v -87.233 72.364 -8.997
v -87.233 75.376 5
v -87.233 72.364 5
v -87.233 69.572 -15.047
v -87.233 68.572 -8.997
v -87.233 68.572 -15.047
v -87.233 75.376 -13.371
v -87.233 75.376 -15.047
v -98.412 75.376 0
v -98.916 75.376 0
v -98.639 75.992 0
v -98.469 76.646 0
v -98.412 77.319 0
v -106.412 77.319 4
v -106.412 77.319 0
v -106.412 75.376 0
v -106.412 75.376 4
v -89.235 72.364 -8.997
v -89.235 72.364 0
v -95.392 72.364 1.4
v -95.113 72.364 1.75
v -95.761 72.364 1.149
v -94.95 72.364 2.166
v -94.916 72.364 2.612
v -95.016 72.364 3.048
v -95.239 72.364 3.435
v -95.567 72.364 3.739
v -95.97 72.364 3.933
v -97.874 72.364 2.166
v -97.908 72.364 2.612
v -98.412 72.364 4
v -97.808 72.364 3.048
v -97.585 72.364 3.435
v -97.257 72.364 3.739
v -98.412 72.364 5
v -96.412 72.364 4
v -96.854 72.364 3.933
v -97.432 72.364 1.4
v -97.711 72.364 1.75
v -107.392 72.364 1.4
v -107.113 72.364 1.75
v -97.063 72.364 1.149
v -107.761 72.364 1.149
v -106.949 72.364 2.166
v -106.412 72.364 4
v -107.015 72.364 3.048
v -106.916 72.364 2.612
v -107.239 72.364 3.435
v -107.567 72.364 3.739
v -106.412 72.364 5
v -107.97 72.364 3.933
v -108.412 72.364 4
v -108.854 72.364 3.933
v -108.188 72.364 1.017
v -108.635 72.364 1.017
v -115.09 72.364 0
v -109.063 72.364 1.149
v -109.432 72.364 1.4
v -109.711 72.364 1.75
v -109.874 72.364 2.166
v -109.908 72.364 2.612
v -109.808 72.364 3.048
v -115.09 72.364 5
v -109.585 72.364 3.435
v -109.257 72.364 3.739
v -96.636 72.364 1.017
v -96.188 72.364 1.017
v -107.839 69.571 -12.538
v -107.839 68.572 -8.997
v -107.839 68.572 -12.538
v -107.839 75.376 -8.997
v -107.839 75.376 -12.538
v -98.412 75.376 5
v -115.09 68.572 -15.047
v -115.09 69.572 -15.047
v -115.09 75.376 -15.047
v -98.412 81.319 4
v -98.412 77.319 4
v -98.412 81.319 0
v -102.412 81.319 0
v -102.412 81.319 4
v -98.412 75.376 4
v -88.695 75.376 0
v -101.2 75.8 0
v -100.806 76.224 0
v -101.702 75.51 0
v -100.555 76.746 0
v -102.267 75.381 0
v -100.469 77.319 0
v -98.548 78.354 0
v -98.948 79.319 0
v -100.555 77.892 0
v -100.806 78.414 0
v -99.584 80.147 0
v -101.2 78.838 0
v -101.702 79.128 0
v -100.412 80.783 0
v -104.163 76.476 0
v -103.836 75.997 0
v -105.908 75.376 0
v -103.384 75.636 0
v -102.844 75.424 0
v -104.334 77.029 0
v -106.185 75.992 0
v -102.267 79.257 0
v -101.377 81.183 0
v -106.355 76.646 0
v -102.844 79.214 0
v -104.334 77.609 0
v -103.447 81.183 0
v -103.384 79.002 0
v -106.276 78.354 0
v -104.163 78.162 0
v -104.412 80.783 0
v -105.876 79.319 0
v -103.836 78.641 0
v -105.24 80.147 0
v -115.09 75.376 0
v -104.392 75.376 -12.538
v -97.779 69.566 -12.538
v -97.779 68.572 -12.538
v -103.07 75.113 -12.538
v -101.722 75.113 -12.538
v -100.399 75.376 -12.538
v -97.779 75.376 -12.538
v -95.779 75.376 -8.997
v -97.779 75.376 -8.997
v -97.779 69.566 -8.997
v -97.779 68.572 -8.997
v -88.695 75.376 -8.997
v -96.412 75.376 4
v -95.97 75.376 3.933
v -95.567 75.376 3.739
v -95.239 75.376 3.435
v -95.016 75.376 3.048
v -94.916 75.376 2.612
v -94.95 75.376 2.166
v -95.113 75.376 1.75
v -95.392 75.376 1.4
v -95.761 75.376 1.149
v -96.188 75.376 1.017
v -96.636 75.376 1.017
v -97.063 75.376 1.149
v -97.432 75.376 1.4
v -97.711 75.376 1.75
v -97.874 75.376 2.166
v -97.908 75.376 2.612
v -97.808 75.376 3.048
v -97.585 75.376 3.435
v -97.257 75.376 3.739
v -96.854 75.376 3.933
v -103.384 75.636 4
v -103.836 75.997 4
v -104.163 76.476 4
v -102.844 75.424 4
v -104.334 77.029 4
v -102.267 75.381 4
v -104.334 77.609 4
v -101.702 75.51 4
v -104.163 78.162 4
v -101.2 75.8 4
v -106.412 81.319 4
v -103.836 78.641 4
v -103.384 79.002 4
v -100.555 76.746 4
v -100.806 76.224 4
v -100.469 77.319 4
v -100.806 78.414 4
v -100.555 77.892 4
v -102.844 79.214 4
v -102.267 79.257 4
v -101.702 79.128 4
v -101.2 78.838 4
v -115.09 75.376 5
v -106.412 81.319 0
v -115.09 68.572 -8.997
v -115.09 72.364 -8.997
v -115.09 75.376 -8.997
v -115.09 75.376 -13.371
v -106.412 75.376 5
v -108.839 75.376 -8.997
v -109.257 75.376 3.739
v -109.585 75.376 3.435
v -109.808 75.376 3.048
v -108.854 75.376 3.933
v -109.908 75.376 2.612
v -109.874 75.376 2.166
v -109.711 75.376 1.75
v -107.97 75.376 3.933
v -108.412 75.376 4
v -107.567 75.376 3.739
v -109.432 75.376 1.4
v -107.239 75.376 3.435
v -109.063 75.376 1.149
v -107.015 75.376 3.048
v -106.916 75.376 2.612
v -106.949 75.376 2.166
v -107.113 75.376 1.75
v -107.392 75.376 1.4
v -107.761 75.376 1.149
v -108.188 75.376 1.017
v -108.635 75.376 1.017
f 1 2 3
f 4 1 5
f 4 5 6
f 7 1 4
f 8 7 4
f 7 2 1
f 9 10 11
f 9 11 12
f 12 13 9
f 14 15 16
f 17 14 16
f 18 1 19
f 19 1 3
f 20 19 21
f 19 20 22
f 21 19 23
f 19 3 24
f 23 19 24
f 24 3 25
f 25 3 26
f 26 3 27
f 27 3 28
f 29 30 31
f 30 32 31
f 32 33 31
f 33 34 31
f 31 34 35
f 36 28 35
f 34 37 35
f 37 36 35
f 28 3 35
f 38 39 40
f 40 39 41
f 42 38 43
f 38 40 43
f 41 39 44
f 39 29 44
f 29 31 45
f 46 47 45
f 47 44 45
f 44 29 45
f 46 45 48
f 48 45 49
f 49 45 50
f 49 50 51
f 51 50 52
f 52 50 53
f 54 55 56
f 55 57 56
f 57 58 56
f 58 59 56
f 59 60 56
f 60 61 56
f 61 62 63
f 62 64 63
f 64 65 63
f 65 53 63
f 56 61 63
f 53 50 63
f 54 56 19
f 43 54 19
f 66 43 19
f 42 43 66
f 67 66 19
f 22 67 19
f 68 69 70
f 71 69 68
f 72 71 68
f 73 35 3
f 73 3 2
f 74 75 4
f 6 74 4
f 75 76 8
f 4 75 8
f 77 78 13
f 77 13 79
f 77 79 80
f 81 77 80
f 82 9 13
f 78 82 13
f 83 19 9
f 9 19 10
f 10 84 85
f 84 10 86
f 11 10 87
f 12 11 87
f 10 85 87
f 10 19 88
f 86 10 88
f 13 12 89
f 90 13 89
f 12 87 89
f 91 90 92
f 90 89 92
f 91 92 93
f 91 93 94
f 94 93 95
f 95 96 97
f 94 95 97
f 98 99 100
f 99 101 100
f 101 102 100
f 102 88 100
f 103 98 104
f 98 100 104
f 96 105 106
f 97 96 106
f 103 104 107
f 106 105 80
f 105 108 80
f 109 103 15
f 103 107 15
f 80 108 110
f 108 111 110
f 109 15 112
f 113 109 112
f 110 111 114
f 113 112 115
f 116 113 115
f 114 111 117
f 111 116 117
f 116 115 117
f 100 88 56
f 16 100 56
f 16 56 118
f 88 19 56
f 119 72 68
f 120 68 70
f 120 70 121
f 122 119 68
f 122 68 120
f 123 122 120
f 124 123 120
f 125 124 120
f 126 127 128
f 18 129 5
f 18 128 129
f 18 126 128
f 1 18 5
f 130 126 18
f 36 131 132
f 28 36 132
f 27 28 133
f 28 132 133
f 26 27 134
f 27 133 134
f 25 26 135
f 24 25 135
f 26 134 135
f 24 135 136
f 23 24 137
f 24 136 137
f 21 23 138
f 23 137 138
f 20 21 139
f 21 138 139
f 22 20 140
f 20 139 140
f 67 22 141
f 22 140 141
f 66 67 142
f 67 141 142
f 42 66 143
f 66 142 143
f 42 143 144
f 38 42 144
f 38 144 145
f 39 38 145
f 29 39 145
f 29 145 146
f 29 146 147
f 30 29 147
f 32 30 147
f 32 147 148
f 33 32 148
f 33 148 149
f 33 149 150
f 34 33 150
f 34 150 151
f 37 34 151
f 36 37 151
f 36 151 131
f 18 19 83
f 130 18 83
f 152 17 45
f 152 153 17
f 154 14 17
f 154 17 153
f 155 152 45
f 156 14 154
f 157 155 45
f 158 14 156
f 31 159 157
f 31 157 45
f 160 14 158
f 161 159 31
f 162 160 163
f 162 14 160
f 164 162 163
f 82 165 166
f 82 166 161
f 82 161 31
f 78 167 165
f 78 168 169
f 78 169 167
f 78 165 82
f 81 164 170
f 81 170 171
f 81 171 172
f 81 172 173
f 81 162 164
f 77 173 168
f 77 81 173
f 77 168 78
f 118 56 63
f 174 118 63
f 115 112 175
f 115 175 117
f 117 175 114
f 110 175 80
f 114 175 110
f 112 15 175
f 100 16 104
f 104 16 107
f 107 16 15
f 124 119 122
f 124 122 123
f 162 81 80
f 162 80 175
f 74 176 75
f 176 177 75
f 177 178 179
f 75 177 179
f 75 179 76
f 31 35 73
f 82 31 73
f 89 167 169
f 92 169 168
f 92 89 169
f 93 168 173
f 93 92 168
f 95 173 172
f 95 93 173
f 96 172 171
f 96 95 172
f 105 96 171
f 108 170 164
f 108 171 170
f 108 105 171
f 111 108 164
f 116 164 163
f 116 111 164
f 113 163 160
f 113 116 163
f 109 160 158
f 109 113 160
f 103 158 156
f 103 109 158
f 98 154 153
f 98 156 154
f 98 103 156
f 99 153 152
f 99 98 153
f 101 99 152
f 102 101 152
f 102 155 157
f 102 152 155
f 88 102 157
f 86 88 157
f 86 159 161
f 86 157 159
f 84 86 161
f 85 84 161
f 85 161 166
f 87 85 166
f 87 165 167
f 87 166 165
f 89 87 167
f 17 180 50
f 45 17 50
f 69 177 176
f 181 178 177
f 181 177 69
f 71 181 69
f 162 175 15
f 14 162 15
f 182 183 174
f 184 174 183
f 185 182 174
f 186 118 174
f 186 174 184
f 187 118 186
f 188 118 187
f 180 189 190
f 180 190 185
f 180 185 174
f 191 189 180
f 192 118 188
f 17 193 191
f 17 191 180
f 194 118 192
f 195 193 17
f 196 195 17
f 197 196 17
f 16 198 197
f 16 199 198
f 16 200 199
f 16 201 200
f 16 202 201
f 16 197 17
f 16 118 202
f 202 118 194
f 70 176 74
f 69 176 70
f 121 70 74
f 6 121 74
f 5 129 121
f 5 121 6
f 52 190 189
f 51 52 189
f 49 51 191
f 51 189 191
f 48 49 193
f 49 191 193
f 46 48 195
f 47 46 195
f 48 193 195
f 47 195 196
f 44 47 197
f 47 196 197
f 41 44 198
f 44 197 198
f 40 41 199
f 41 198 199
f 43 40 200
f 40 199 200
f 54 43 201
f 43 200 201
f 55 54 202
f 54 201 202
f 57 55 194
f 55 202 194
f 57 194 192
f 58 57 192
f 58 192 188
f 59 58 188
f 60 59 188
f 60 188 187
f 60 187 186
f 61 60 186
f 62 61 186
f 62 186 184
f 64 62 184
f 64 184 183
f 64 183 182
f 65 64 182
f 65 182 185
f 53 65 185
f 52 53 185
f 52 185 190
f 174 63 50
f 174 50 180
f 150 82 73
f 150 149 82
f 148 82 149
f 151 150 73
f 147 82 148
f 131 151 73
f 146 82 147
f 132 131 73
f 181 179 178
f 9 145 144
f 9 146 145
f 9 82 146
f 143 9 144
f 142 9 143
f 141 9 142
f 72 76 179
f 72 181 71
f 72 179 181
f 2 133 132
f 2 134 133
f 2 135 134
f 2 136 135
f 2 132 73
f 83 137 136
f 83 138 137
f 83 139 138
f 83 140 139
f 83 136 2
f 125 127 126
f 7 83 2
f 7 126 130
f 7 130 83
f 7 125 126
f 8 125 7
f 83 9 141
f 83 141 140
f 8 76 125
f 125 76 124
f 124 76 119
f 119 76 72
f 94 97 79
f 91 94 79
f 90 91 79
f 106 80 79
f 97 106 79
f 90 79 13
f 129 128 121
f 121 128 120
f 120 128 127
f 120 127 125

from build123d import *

# Parameters (mm, degrees)
SKETCH1_R                 = 1.943369714
BOSS_EXTRUDE1_DEPTH       = 5
SKETCH2_W                 = 5
SKETCH2_H                 = 3.011554738
BOSS_EXTRUDE2_DEPTH       = 3
SKETCH3_W                 = 5
SKETCH3_H                 = 3.011554738
BOSS_EXTRUDE3_DEPTH       = 1
BOSS_EXTRUDE4_DEPTH       = 15.45
BOSS_EXTRUDE5_DEPTH       = 5
BOSS_EXTRUDE6_REACH       = 91.127
SKETCH6_W                 = 4.39741832
SKETCH6_H                 = 3.011554738
SKETCH7_W                 = 27.232002546
SKETCH7_H                 = 1.691876565
BOSS_EXTRUDE7_DEPTH       = 3.011555
CUT_EXTRUDE1_DEPTH        = 1.691877
SKETCH10_R                = 1.5
CUT_EXTRUDE2_DEPTH        = 5
CUT_EXTRUDE3_DEPTH        = 5
SKETCH12_W                = 7.087819815
SKETCH12_H                = 5.363231601
SKETCH12_W_2              = 7.084410937
BOSS_EXTRUDE8_DEPTH       = 3.011555
SKETCH13_R                = 1.5
CUT_EXTRUDE4_DEPTH        = 5
BOSS_EXTRUDE9_START       = -5.000001
BOSS_EXTRUDE9_DEPTH       = 5.000002
SKETCH15_R                = 1.5
BOSS_EXTRUDE10_DEPTH      = 3.011554738
CUT_EXTRUDE6_DEPTH        = 3.011555
BOSS_EXTRUDE11_START      = 1
BOSS_EXTRUDE11_DEPTH      = 1
CUT_EXTRUDE7_DEPTH        = 4
SKETCH21_R                = 1.5
CUT_EXTRUDE8_DEPTH        = 4
CUT_EXTRUDE9_DEPTH        = 1
BOSS_EXTRUDE12_START      = -13.37096588
BOSS_EXTRUDE12_DEPTH      = 4.373492366
BOSS_EXTRUDE13_DEPTH      = 1.68162
SKETCH30_W                = 13.059771794
SKETCH30_H                = 2.186746183
CUT_EXTRUDE10_DEPTH       = 10
SKETCH31_W                = 13.059771794
SKETCH31_H                = 2.186746183
BOSS_EXTRUDE14_DEPTH      = 2.793186
SKETCH32_W                = 27.857200393
SKETCH32_H                = 1.676275872
BOSS_EXTRUDE15_DEPTH      = 5.803619
SKETCH33_W                = 13.059771794
SKETCH33_H                = 1.354144498
CUT_EXTRUDE11_DEPTH       = 5.804742
BOSS_EXTRUDE16_DEPTH      = 0.832602
SKETCH35_W                = 2
SKETCH35_H                = 3.540890681
BOSS_EXTRUDE17_DEPTH      = 5.809427
SKETCH36_W                = 1
SKETCH36_H                = 3.540890681
BOSS_EXTRUDE18_DEPTH      = 5.80474
BOSS_EXTRUDE20_DEPTH      = 2
BOSS_EXTRUDE20_DEPTH_BACK = 2
CUT_EXTRUDE12_DEPTH       = 1


# Read off the part's stored shape, not the designer's step: Boss-Extrude12
with BuildPart() as part:
    # Sketch1 → Boss-Extrude1 (new body)
    with BuildSketch(Plane.XY):
        with BuildLine():
            Line((-105.90797469, 75.375672325), (-114.442913217, 75.375672325))
            Line((-114.442913217, 75.375672325), (-114.442913217, 72.364117587))
            Line((-114.442913217, 72.364117587), (-88.233212536, 72.364117587))
            Line((-88.233212536, 72.364117587), (-88.233212536, 75.375672325))
            Line((-88.233212536, 75.375672325), (-98.915825857, 75.375672325))
            ThreePointArc((-98.915825857, 75.375672325), (-102.411900273, 81.318944809), (-105.90797469, 75.375672325))
        make_face()
        with Locations((-102.411900273, 77.319042039)):
            Circle(SKETCH1_R, mode=Mode.SUBTRACT)
    extrude(amount=BOSS_EXTRUDE1_DEPTH)

    # Sketch2 → Boss-Extrude2 (add)
    with BuildSketch(Plane.ZY.offset(114.442913217)):
        with Locations((2.5, 73.869894956)):
            Rectangle(SKETCH2_W, SKETCH2_H)
    extrude(amount=BOSS_EXTRUDE2_DEPTH)

    # Sketch3 → Boss-Extrude3 (add)
    with BuildSketch(Plane(origin=(-88.233212536, 0, 0), x_dir=(0, 0, -1), z_dir=(1, 0, 0))):
        with Locations((-2.5, 73.869894956)):
            Rectangle(SKETCH3_W, SKETCH3_H)
    extrude(amount=BOSS_EXTRUDE3_DEPTH)

    # Sketch4 → Boss-Extrude4 (add)
    with BuildSketch(Plane(origin=(0, 0, 0), x_dir=(-1, 0, 0), z_dir=(0, 0, -1))):
        Polygon((89.234854516, 72.364117587), (87.233212536, 72.364117587), (87.233212536, 75.375672325), (88.695072503, 75.375672325), align=None)
        Polygon((117.442913217, 75.375672325), (117.442913217, 72.364117587), (115.090412929, 72.364117587), (115.927075049, 75.375672325), align=None)
    extrude(amount=BOSS_EXTRUDE4_DEPTH)

    # Sketch5 → Boss-Extrude5 (add)
    with BuildSketch(Plane(origin=(0, 0, -15.45), x_dir=(-1, 0, 0), z_dir=(0, 0, -1))):
        Polygon((89.234854516, 72.364117587), (88.695072503, 75.375672325), (87.233212536, 75.375672325), (87.233212536, 72.364117587), align=None)
        Polygon((117.442913217, 72.364117587), (117.442913217, 75.375672325), (115.927075049, 75.375672325), (115.090412929, 72.364117587), align=None)
    extrude(amount=BOSS_EXTRUDE5_DEPTH)

    # Boss-Extrude6: up to this plane
    boss_extrude6_end = Plane(origin=(-115.927075049, 75.375672325, -19.271481329), z_dir=(-0.9635080795452587, -0.2676792495712127, 0))
    # Sketch6 → Boss-Extrude6 (add, up to the surface)
    with BuildSketch(Plane(origin=(-87.233212536, 0, 0), x_dir=(0, 0, -1), z_dir=(1, 0, 0)), mode=Mode.PRIVATE) as boss_extrude6_sk1:
        with Locations((18.25129084, 73.869894956)):
            Rectangle(SKETCH6_W, SKETCH6_H)
    boss_extrude6_tool1 = split(extrude(boss_extrude6_sk1.sketch, amount=-BOSS_EXTRUDE6_REACH, mode=Mode.PRIVATE), bisect_by=boss_extrude6_end, keep=Keep.BOTH, mode=Mode.PRIVATE)
    add(boss_extrude6_tool1.solids().sort_by_distance((-87.233213, 73.869895, -18.251291))[0])

    # Sketch7 → Boss-Extrude7 (add)
    with BuildSketch(Plane(origin=(0, 75.375672325, 0), x_dir=(1, 0, 0), z_dir=(0, 1, 0))):
        with Locations((-102.311073776, 9.843411796)):
            Rectangle(SKETCH7_W, SKETCH7_H)
    extrude(amount=-BOSS_EXTRUDE7_DEPTH)

    # Sketch9 → Cut-Extrude1 (cut)
    with BuildSketch(Plane(origin=(0, 0, -10.689350079), x_dir=(-1, 0, 0), z_dir=(0, 0, -1))):
        with BuildLine():
            Line((100.39939301, 75.375672325), (104.391873417, 75.375672325))
            ThreePointArc((104.391873417, 75.375672325), (102.395633214, 75.079709627), (100.39939301, 75.375672325))
        make_face()
    extrude(amount=-CUT_EXTRUDE1_DEPTH, mode=Mode.SUBTRACT)

    # Sketch10 → Cut-Extrude2 (cut)
    with BuildSketch(Plane(origin=(0, 75.375672325, 0), x_dir=(1, 0, 0), z_dir=(0, 1, 0))):
        with Locations(Location((-102.389399958, 18.296933794, 0), (0, 0, 270))):
            Circle(SKETCH10_R)
        with Locations(Location((-114.196864357, -2.469689872, 0), (0, 0, 270))):
            Circle(SKETCH10_R)
        with Locations(Location((-90.467618586, -2.570513513, 0), (0, 0, 270))):
            Circle(SKETCH10_R)
    extrude(amount=-CUT_EXTRUDE2_DEPTH, mode=Mode.SUBTRACT)

    # Sketch11 → Cut-Extrude3 (cut)
    with BuildSketch(Plane(origin=(0, 75.375672325, 0), x_dir=(1, 0, 0), z_dir=(0, 1, 0))):
        Polygon((-87.233212536, 20.45), (-115.927075049, 20.45), (-117.442913217, 20.45), (-117.442913217, 16.05258168), (-115.927075049, 16.05258168), (-87.233212536, 16.05258168), align=None)
    extrude(amount=-CUT_EXTRUDE3_DEPTH, mode=Mode.SUBTRACT)

    # Sketch12 → Boss-Extrude8 (add)
    with BuildSketch(Plane(origin=(0, 75.375672325, 0), x_dir=(1, 0, 0), z_dir=(0, 1, 0))):
        with Locations((-112.383165142, 13.370965879)):
            Rectangle(SKETCH12_W, SKETCH12_H)
        with Locations((-92.237277972, 13.370965879)):
            Rectangle(SKETCH12_W_2, SKETCH12_H)
    extrude(amount=-BOSS_EXTRUDE8_DEPTH)

    # Sketch13 → Cut-Extrude4 (cut)
    with BuildSketch(Plane(origin=(0, 75.375672325, 0), x_dir=(1, 0, 0), z_dir=(0, 1, 0))):
        with Locations(Location((-91.387861774, 12.69615807, 0), (0, 0, 270))):
            Circle(SKETCH13_R)
        with Locations(Location((-112.880960362, 12.852813307, 0), (0, 0, 270))):
            Circle(SKETCH13_R)
    extrude(amount=-CUT_EXTRUDE4_DEPTH, mode=Mode.SUBTRACT)

    # Sketch14 → Boss-Extrude9 (add)
    with BuildSketch(Plane.XY.offset(5).offset(BOSS_EXTRUDE9_START)):
        with BuildLine():
            Line((-102.411900273, 81.318944809), (-106.411803043, 81.318944809))
            Line((-106.411803043, 81.318944809), (-106.411803043, 77.319042039))
            ThreePointArc((-106.411803043, 77.319042039), (-105.240258646, 80.147400412), (-102.411900273, 81.318944809))
        make_face()
        with BuildLine():
            ThreePointArc((-105.90797469, 75.375672325), (-106.283797735, 76.315233186), (-106.411803043, 77.319042039))
            Line((-106.411803043, 77.319042039), (-106.411803043, 75.375672325))
            Line((-106.411803043, 75.375672325), (-105.90797469, 75.375672325))
        make_face()
        with BuildLine():
            Line((-98.411997503, 81.318944809), (-102.411900273, 81.318944809))
            ThreePointArc((-102.411900273, 81.318944809), (-99.583541901, 80.147400412), (-98.411997503, 77.319042039))
            Line((-98.411997503, 77.319042039), (-98.411997503, 81.318944809))
        make_face()
        with BuildLine():
            Line((-98.411997503, 75.375672325), (-98.411997503, 77.319042039))
            ThreePointArc((-98.411997503, 77.319042039), (-98.540002811, 76.315233186), (-98.915825857, 75.375672325))
            Line((-98.915825857, 75.375672325), (-98.411997503, 75.375672325))
        make_face()
    extrude(amount=BOSS_EXTRUDE9_DEPTH)

    # Sketch15 → Boss-Extrude10 (add)
    with BuildSketch(Plane(origin=(0, 75.375672325, 0), x_dir=(1, 0, 0), z_dir=(0, 1, 0))):
        with Locations((-114.196864357, -2.469689872)):
            Circle(SKETCH15_R)
        with Locations((-90.467618586, -2.570513513)):
            Circle(SKETCH15_R)
        with Locations((-91.387861774, 12.69615807)):
            Circle(SKETCH15_R)
        with Locations((-112.880960362, 12.852813307)):
            Circle(SKETCH15_R)
    extrude(amount=-BOSS_EXTRUDE10_DEPTH)

    # Sketch17 → Cut-Extrude6 (cut)
    with BuildSketch(Plane(origin=(0, 75.375672325, 0), x_dir=(1, 0, 0), z_dir=(0, 1, 0))):
        Polygon((-108.839255234, 13.37096588), (-117.442913217, 13.37096588), (-117.442913217, 16.05258168), (-87.233212536, 16.05258168), (-87.233212536, 13.37096588), (-95.77948344, 13.37096588), align=None)
    extrude(amount=-CUT_EXTRUDE6_DEPTH, mode=Mode.SUBTRACT)

    # Sketch19 → Boss-Extrude11 (add)
    with BuildSketch(Plane(origin=(0, 0, -10.689350079), x_dir=(-1, 0, 0), z_dir=(0, 0, -1)).offset(BOSS_EXTRUDE11_START)):
        with BuildLine():
            Line((95.77948344, 75.375672325), (95.77948344, 72.364117587))
            Line((95.77948344, 72.364117587), (108.839255234, 72.364117587))
            Line((108.839255234, 72.364117587), (108.839255234, 75.375672325))
            Line((108.839255234, 75.375672325), (104.391873417, 75.375672325))
            ThreePointArc((104.391873417, 75.375672325), (102.395633214, 75.079709627), (100.39939301, 75.375672325))
            Line((100.39939301, 75.375672325), (95.77948344, 75.375672325))
        make_face()
    extrude(amount=-BOSS_EXTRUDE11_DEPTH)

    # Sketch20 → Cut-Extrude7 (cut)
    with BuildSketch(Plane.XZ.offset(-72.364117587)):
        Polygon((-117.442913217, -13.37096588), (-115.090412929, -13.37096588), (-115.090412929, 0), (-115.090412929, 5), (-117.442913217, 5), (-117.442913217, 0), align=None)
    extrude(amount=-CUT_EXTRUDE7_DEPTH, mode=Mode.SUBTRACT)

    # Sketch21 → Cut-Extrude8 (cut)
    with BuildSketch(Plane(origin=(0, 75.375672325, 0), x_dir=(1, 0, 0), z_dir=(0, 1, 0))):
        with Locations(Location((-96.411997503, -2.5, 0), (0, 0, 270))):
            Circle(SKETCH21_R)
        with Locations(Location((-108.411803043, -2.5, 0), (0, 0, 270))):
            Circle(SKETCH21_R)
    extrude(amount=-CUT_EXTRUDE8_DEPTH, mode=Mode.SUBTRACT)

    # Sketch22 → Cut-Extrude9 (cut)
    with BuildSketch(Plane.XY.offset(5)):
        Polygon((-106.411803043, 75.375672325), (-106.411803043, 72.364117587), (-98.411997503, 72.364117587), (-98.411997503, 75.375672325), (-98.411997503, 81.318944809), (-106.411803043, 81.318944809), align=None)
    extrude(amount=-CUT_EXTRUDE9_DEPTH, mode=Mode.SUBTRACT)


with BuildPart() as cut_extrude9_kept_piece:
    # of the separate pieces the step leaves, the one the design keeps (cut_extrude9_pieces_kept)
    add(part.part.solids().sort_by_distance((-106.411803043, 75.375672325, 0))[0])

    # Boss-Extrude12 outline → Boss-Extrude12 (add)
    with BuildSketch(Plane.XY.offset(BOSS_EXTRUDE12_START)):
        Polygon((-95.77948344, 69.566245358), (-87.233212536, 69.56317843), (-87.233212536, 72.364117587), (-95.77948344, 72.364117587), align=None)
        Polygon((-108.839255234, 69.570932009), (-108.839255234, 72.364117587), (-115.090412929, 72.364117587), (-115.090412929, 69.57317531), align=None)
    extrude(amount=BOSS_EXTRUDE12_DEPTH)

    # Sketch26 → Boss-Extrude13 (add)
    with BuildSketch(Plane(origin=(0, 0, -11.689350079), x_dir=(-1, 0, 0), z_dir=(0, 0, -1))):
        with BuildLine():
            Line((100.39939301, 75.375672325), (95.77948344, 75.375672325))
            Line((95.77948344, 75.375672325), (95.77948344, 72.364117587))
            Line((95.77948344, 72.364117587), (108.839255234, 72.364117587))
            Line((108.839255234, 72.364117587), (108.839255234, 75.375672325))
            Line((108.839255234, 75.375672325), (104.391873417, 75.375672325))
            ThreePointArc((104.391873417, 75.375672325), (102.395633214, 75.079709627), (100.39939301, 75.375672325))
        make_face()
    extrude(amount=BOSS_EXTRUDE13_DEPTH)

    # Sketch30 → Cut-Extrude10 (cut)
    with BuildSketch(Plane(origin=(0, 75.375672325, 0), x_dir=(1, 0, 0), z_dir=(0, 1, 0))):
        with Locations((-102.309369337, 10.090846606)):
            Rectangle(SKETCH30_W, SKETCH30_H)
    extrude(amount=-CUT_EXTRUDE10_DEPTH, mode=Mode.SUBTRACT)

    # Sketch31 → Boss-Extrude14 (add)
    with BuildSketch(Plane.XZ.offset(-72.364117587)):
        with Locations((-102.309369337, -12.277592789)):
            Rectangle(SKETCH31_W, SKETCH31_H)
    extrude(amount=BOSS_EXTRUDE14_DEPTH)

    # Sketch32 → Boss-Extrude15 (add)
    with BuildSketch(Plane(origin=(0, 75.375672325, 0), x_dir=(1, 0, 0), z_dir=(0, 1, 0))):
        with Locations((-101.161812733, 14.209103816)):
            Rectangle(SKETCH32_W, SKETCH32_H)
    extrude(amount=-BOSS_EXTRUDE15_DEPTH)

    # Sketch33 → Cut-Extrude11 (cut)
    with BuildSketch(Plane(origin=(0, 75.375672325, 0), x_dir=(1, 0, 0), z_dir=(0, 1, 0))):
        with Locations((-102.309369337, 11.861291946)):
            Rectangle(SKETCH33_W, SKETCH33_H)
    extrude(amount=-CUT_EXTRUDE11_DEPTH, mode=Mode.SUBTRACT)

    # Sketch34 → Boss-Extrude16 (add)
    with BuildSketch(Plane.XY.offset(-13.37096588)):
        with BuildLine():
            Line((-100.39939301, 75.375672325), (-104.391873417, 75.375672325))
            ThreePointArc((-104.391873417, 75.375672325), (-102.395633214, 75.079709627), (-100.39939301, 75.375672325))
        make_face()
    extrude(amount=BOSS_EXTRUDE16_DEPTH)

    # Sketch35 → Boss-Extrude17 (add)
    with BuildSketch(Plane(origin=(0, 75.375672325, 0), x_dir=(1, 0, 0), z_dir=(0, 1, 0))):
        with Locations((-96.77948344, 10.767918855)):
            Rectangle(SKETCH35_W, SKETCH35_H)
    extrude(amount=-BOSS_EXTRUDE17_DEPTH)

    # Sketch36 → Boss-Extrude18 (add)
    with BuildSketch(Plane(origin=(0, 75.375672325, 0), x_dir=(1, 0, 0), z_dir=(0, 1, 0))):
        with Locations((-108.339255234, 10.767918855)):
            Rectangle(SKETCH36_W, SKETCH36_H)
    extrude(amount=-BOSS_EXTRUDE18_DEPTH)

    # Sketch37 → Boss-Extrude20 (add, two sides: drawn at the far end of the back side and taken through both)
    with BuildSketch(Plane.XZ.offset(-69.57205366).offset(-BOSS_EXTRUDE20_DEPTH_BACK)):
        Polygon((-115.090412929, -15.047241752), (-115.090412929, -8.997473514), (-107.839255234, -8.997473514), (-107.839255234, -12.538364195), (-97.77948344, -12.538364195), (-97.77948344, -8.997473514), (-87.233212536, -8.997473514), (-87.233212536, -15.047241752), align=None)
    extrude(amount=BOSS_EXTRUDE20_DEPTH + BOSS_EXTRUDE20_DEPTH_BACK)

    # Sketch39 → Cut-Extrude12 (cut)
    with BuildSketch(Plane.XZ.offset(-67.57205366)):
        Polygon((-115.090412929, -15.047241752), (-87.233212536, -15.047241752), (-87.233212536, -8.997473514), (-97.77948344, -8.997473514), (-97.77948344, -12.538364195), (-107.839255234, -12.538364195), (-107.839255234, -8.997473514), (-115.090412929, -8.997473514), align=None)
    extrude(amount=-CUT_EXTRUDE12_DEPTH, mode=Mode.SUBTRACT)


solid = cut_extrude9_kept_piece.part
